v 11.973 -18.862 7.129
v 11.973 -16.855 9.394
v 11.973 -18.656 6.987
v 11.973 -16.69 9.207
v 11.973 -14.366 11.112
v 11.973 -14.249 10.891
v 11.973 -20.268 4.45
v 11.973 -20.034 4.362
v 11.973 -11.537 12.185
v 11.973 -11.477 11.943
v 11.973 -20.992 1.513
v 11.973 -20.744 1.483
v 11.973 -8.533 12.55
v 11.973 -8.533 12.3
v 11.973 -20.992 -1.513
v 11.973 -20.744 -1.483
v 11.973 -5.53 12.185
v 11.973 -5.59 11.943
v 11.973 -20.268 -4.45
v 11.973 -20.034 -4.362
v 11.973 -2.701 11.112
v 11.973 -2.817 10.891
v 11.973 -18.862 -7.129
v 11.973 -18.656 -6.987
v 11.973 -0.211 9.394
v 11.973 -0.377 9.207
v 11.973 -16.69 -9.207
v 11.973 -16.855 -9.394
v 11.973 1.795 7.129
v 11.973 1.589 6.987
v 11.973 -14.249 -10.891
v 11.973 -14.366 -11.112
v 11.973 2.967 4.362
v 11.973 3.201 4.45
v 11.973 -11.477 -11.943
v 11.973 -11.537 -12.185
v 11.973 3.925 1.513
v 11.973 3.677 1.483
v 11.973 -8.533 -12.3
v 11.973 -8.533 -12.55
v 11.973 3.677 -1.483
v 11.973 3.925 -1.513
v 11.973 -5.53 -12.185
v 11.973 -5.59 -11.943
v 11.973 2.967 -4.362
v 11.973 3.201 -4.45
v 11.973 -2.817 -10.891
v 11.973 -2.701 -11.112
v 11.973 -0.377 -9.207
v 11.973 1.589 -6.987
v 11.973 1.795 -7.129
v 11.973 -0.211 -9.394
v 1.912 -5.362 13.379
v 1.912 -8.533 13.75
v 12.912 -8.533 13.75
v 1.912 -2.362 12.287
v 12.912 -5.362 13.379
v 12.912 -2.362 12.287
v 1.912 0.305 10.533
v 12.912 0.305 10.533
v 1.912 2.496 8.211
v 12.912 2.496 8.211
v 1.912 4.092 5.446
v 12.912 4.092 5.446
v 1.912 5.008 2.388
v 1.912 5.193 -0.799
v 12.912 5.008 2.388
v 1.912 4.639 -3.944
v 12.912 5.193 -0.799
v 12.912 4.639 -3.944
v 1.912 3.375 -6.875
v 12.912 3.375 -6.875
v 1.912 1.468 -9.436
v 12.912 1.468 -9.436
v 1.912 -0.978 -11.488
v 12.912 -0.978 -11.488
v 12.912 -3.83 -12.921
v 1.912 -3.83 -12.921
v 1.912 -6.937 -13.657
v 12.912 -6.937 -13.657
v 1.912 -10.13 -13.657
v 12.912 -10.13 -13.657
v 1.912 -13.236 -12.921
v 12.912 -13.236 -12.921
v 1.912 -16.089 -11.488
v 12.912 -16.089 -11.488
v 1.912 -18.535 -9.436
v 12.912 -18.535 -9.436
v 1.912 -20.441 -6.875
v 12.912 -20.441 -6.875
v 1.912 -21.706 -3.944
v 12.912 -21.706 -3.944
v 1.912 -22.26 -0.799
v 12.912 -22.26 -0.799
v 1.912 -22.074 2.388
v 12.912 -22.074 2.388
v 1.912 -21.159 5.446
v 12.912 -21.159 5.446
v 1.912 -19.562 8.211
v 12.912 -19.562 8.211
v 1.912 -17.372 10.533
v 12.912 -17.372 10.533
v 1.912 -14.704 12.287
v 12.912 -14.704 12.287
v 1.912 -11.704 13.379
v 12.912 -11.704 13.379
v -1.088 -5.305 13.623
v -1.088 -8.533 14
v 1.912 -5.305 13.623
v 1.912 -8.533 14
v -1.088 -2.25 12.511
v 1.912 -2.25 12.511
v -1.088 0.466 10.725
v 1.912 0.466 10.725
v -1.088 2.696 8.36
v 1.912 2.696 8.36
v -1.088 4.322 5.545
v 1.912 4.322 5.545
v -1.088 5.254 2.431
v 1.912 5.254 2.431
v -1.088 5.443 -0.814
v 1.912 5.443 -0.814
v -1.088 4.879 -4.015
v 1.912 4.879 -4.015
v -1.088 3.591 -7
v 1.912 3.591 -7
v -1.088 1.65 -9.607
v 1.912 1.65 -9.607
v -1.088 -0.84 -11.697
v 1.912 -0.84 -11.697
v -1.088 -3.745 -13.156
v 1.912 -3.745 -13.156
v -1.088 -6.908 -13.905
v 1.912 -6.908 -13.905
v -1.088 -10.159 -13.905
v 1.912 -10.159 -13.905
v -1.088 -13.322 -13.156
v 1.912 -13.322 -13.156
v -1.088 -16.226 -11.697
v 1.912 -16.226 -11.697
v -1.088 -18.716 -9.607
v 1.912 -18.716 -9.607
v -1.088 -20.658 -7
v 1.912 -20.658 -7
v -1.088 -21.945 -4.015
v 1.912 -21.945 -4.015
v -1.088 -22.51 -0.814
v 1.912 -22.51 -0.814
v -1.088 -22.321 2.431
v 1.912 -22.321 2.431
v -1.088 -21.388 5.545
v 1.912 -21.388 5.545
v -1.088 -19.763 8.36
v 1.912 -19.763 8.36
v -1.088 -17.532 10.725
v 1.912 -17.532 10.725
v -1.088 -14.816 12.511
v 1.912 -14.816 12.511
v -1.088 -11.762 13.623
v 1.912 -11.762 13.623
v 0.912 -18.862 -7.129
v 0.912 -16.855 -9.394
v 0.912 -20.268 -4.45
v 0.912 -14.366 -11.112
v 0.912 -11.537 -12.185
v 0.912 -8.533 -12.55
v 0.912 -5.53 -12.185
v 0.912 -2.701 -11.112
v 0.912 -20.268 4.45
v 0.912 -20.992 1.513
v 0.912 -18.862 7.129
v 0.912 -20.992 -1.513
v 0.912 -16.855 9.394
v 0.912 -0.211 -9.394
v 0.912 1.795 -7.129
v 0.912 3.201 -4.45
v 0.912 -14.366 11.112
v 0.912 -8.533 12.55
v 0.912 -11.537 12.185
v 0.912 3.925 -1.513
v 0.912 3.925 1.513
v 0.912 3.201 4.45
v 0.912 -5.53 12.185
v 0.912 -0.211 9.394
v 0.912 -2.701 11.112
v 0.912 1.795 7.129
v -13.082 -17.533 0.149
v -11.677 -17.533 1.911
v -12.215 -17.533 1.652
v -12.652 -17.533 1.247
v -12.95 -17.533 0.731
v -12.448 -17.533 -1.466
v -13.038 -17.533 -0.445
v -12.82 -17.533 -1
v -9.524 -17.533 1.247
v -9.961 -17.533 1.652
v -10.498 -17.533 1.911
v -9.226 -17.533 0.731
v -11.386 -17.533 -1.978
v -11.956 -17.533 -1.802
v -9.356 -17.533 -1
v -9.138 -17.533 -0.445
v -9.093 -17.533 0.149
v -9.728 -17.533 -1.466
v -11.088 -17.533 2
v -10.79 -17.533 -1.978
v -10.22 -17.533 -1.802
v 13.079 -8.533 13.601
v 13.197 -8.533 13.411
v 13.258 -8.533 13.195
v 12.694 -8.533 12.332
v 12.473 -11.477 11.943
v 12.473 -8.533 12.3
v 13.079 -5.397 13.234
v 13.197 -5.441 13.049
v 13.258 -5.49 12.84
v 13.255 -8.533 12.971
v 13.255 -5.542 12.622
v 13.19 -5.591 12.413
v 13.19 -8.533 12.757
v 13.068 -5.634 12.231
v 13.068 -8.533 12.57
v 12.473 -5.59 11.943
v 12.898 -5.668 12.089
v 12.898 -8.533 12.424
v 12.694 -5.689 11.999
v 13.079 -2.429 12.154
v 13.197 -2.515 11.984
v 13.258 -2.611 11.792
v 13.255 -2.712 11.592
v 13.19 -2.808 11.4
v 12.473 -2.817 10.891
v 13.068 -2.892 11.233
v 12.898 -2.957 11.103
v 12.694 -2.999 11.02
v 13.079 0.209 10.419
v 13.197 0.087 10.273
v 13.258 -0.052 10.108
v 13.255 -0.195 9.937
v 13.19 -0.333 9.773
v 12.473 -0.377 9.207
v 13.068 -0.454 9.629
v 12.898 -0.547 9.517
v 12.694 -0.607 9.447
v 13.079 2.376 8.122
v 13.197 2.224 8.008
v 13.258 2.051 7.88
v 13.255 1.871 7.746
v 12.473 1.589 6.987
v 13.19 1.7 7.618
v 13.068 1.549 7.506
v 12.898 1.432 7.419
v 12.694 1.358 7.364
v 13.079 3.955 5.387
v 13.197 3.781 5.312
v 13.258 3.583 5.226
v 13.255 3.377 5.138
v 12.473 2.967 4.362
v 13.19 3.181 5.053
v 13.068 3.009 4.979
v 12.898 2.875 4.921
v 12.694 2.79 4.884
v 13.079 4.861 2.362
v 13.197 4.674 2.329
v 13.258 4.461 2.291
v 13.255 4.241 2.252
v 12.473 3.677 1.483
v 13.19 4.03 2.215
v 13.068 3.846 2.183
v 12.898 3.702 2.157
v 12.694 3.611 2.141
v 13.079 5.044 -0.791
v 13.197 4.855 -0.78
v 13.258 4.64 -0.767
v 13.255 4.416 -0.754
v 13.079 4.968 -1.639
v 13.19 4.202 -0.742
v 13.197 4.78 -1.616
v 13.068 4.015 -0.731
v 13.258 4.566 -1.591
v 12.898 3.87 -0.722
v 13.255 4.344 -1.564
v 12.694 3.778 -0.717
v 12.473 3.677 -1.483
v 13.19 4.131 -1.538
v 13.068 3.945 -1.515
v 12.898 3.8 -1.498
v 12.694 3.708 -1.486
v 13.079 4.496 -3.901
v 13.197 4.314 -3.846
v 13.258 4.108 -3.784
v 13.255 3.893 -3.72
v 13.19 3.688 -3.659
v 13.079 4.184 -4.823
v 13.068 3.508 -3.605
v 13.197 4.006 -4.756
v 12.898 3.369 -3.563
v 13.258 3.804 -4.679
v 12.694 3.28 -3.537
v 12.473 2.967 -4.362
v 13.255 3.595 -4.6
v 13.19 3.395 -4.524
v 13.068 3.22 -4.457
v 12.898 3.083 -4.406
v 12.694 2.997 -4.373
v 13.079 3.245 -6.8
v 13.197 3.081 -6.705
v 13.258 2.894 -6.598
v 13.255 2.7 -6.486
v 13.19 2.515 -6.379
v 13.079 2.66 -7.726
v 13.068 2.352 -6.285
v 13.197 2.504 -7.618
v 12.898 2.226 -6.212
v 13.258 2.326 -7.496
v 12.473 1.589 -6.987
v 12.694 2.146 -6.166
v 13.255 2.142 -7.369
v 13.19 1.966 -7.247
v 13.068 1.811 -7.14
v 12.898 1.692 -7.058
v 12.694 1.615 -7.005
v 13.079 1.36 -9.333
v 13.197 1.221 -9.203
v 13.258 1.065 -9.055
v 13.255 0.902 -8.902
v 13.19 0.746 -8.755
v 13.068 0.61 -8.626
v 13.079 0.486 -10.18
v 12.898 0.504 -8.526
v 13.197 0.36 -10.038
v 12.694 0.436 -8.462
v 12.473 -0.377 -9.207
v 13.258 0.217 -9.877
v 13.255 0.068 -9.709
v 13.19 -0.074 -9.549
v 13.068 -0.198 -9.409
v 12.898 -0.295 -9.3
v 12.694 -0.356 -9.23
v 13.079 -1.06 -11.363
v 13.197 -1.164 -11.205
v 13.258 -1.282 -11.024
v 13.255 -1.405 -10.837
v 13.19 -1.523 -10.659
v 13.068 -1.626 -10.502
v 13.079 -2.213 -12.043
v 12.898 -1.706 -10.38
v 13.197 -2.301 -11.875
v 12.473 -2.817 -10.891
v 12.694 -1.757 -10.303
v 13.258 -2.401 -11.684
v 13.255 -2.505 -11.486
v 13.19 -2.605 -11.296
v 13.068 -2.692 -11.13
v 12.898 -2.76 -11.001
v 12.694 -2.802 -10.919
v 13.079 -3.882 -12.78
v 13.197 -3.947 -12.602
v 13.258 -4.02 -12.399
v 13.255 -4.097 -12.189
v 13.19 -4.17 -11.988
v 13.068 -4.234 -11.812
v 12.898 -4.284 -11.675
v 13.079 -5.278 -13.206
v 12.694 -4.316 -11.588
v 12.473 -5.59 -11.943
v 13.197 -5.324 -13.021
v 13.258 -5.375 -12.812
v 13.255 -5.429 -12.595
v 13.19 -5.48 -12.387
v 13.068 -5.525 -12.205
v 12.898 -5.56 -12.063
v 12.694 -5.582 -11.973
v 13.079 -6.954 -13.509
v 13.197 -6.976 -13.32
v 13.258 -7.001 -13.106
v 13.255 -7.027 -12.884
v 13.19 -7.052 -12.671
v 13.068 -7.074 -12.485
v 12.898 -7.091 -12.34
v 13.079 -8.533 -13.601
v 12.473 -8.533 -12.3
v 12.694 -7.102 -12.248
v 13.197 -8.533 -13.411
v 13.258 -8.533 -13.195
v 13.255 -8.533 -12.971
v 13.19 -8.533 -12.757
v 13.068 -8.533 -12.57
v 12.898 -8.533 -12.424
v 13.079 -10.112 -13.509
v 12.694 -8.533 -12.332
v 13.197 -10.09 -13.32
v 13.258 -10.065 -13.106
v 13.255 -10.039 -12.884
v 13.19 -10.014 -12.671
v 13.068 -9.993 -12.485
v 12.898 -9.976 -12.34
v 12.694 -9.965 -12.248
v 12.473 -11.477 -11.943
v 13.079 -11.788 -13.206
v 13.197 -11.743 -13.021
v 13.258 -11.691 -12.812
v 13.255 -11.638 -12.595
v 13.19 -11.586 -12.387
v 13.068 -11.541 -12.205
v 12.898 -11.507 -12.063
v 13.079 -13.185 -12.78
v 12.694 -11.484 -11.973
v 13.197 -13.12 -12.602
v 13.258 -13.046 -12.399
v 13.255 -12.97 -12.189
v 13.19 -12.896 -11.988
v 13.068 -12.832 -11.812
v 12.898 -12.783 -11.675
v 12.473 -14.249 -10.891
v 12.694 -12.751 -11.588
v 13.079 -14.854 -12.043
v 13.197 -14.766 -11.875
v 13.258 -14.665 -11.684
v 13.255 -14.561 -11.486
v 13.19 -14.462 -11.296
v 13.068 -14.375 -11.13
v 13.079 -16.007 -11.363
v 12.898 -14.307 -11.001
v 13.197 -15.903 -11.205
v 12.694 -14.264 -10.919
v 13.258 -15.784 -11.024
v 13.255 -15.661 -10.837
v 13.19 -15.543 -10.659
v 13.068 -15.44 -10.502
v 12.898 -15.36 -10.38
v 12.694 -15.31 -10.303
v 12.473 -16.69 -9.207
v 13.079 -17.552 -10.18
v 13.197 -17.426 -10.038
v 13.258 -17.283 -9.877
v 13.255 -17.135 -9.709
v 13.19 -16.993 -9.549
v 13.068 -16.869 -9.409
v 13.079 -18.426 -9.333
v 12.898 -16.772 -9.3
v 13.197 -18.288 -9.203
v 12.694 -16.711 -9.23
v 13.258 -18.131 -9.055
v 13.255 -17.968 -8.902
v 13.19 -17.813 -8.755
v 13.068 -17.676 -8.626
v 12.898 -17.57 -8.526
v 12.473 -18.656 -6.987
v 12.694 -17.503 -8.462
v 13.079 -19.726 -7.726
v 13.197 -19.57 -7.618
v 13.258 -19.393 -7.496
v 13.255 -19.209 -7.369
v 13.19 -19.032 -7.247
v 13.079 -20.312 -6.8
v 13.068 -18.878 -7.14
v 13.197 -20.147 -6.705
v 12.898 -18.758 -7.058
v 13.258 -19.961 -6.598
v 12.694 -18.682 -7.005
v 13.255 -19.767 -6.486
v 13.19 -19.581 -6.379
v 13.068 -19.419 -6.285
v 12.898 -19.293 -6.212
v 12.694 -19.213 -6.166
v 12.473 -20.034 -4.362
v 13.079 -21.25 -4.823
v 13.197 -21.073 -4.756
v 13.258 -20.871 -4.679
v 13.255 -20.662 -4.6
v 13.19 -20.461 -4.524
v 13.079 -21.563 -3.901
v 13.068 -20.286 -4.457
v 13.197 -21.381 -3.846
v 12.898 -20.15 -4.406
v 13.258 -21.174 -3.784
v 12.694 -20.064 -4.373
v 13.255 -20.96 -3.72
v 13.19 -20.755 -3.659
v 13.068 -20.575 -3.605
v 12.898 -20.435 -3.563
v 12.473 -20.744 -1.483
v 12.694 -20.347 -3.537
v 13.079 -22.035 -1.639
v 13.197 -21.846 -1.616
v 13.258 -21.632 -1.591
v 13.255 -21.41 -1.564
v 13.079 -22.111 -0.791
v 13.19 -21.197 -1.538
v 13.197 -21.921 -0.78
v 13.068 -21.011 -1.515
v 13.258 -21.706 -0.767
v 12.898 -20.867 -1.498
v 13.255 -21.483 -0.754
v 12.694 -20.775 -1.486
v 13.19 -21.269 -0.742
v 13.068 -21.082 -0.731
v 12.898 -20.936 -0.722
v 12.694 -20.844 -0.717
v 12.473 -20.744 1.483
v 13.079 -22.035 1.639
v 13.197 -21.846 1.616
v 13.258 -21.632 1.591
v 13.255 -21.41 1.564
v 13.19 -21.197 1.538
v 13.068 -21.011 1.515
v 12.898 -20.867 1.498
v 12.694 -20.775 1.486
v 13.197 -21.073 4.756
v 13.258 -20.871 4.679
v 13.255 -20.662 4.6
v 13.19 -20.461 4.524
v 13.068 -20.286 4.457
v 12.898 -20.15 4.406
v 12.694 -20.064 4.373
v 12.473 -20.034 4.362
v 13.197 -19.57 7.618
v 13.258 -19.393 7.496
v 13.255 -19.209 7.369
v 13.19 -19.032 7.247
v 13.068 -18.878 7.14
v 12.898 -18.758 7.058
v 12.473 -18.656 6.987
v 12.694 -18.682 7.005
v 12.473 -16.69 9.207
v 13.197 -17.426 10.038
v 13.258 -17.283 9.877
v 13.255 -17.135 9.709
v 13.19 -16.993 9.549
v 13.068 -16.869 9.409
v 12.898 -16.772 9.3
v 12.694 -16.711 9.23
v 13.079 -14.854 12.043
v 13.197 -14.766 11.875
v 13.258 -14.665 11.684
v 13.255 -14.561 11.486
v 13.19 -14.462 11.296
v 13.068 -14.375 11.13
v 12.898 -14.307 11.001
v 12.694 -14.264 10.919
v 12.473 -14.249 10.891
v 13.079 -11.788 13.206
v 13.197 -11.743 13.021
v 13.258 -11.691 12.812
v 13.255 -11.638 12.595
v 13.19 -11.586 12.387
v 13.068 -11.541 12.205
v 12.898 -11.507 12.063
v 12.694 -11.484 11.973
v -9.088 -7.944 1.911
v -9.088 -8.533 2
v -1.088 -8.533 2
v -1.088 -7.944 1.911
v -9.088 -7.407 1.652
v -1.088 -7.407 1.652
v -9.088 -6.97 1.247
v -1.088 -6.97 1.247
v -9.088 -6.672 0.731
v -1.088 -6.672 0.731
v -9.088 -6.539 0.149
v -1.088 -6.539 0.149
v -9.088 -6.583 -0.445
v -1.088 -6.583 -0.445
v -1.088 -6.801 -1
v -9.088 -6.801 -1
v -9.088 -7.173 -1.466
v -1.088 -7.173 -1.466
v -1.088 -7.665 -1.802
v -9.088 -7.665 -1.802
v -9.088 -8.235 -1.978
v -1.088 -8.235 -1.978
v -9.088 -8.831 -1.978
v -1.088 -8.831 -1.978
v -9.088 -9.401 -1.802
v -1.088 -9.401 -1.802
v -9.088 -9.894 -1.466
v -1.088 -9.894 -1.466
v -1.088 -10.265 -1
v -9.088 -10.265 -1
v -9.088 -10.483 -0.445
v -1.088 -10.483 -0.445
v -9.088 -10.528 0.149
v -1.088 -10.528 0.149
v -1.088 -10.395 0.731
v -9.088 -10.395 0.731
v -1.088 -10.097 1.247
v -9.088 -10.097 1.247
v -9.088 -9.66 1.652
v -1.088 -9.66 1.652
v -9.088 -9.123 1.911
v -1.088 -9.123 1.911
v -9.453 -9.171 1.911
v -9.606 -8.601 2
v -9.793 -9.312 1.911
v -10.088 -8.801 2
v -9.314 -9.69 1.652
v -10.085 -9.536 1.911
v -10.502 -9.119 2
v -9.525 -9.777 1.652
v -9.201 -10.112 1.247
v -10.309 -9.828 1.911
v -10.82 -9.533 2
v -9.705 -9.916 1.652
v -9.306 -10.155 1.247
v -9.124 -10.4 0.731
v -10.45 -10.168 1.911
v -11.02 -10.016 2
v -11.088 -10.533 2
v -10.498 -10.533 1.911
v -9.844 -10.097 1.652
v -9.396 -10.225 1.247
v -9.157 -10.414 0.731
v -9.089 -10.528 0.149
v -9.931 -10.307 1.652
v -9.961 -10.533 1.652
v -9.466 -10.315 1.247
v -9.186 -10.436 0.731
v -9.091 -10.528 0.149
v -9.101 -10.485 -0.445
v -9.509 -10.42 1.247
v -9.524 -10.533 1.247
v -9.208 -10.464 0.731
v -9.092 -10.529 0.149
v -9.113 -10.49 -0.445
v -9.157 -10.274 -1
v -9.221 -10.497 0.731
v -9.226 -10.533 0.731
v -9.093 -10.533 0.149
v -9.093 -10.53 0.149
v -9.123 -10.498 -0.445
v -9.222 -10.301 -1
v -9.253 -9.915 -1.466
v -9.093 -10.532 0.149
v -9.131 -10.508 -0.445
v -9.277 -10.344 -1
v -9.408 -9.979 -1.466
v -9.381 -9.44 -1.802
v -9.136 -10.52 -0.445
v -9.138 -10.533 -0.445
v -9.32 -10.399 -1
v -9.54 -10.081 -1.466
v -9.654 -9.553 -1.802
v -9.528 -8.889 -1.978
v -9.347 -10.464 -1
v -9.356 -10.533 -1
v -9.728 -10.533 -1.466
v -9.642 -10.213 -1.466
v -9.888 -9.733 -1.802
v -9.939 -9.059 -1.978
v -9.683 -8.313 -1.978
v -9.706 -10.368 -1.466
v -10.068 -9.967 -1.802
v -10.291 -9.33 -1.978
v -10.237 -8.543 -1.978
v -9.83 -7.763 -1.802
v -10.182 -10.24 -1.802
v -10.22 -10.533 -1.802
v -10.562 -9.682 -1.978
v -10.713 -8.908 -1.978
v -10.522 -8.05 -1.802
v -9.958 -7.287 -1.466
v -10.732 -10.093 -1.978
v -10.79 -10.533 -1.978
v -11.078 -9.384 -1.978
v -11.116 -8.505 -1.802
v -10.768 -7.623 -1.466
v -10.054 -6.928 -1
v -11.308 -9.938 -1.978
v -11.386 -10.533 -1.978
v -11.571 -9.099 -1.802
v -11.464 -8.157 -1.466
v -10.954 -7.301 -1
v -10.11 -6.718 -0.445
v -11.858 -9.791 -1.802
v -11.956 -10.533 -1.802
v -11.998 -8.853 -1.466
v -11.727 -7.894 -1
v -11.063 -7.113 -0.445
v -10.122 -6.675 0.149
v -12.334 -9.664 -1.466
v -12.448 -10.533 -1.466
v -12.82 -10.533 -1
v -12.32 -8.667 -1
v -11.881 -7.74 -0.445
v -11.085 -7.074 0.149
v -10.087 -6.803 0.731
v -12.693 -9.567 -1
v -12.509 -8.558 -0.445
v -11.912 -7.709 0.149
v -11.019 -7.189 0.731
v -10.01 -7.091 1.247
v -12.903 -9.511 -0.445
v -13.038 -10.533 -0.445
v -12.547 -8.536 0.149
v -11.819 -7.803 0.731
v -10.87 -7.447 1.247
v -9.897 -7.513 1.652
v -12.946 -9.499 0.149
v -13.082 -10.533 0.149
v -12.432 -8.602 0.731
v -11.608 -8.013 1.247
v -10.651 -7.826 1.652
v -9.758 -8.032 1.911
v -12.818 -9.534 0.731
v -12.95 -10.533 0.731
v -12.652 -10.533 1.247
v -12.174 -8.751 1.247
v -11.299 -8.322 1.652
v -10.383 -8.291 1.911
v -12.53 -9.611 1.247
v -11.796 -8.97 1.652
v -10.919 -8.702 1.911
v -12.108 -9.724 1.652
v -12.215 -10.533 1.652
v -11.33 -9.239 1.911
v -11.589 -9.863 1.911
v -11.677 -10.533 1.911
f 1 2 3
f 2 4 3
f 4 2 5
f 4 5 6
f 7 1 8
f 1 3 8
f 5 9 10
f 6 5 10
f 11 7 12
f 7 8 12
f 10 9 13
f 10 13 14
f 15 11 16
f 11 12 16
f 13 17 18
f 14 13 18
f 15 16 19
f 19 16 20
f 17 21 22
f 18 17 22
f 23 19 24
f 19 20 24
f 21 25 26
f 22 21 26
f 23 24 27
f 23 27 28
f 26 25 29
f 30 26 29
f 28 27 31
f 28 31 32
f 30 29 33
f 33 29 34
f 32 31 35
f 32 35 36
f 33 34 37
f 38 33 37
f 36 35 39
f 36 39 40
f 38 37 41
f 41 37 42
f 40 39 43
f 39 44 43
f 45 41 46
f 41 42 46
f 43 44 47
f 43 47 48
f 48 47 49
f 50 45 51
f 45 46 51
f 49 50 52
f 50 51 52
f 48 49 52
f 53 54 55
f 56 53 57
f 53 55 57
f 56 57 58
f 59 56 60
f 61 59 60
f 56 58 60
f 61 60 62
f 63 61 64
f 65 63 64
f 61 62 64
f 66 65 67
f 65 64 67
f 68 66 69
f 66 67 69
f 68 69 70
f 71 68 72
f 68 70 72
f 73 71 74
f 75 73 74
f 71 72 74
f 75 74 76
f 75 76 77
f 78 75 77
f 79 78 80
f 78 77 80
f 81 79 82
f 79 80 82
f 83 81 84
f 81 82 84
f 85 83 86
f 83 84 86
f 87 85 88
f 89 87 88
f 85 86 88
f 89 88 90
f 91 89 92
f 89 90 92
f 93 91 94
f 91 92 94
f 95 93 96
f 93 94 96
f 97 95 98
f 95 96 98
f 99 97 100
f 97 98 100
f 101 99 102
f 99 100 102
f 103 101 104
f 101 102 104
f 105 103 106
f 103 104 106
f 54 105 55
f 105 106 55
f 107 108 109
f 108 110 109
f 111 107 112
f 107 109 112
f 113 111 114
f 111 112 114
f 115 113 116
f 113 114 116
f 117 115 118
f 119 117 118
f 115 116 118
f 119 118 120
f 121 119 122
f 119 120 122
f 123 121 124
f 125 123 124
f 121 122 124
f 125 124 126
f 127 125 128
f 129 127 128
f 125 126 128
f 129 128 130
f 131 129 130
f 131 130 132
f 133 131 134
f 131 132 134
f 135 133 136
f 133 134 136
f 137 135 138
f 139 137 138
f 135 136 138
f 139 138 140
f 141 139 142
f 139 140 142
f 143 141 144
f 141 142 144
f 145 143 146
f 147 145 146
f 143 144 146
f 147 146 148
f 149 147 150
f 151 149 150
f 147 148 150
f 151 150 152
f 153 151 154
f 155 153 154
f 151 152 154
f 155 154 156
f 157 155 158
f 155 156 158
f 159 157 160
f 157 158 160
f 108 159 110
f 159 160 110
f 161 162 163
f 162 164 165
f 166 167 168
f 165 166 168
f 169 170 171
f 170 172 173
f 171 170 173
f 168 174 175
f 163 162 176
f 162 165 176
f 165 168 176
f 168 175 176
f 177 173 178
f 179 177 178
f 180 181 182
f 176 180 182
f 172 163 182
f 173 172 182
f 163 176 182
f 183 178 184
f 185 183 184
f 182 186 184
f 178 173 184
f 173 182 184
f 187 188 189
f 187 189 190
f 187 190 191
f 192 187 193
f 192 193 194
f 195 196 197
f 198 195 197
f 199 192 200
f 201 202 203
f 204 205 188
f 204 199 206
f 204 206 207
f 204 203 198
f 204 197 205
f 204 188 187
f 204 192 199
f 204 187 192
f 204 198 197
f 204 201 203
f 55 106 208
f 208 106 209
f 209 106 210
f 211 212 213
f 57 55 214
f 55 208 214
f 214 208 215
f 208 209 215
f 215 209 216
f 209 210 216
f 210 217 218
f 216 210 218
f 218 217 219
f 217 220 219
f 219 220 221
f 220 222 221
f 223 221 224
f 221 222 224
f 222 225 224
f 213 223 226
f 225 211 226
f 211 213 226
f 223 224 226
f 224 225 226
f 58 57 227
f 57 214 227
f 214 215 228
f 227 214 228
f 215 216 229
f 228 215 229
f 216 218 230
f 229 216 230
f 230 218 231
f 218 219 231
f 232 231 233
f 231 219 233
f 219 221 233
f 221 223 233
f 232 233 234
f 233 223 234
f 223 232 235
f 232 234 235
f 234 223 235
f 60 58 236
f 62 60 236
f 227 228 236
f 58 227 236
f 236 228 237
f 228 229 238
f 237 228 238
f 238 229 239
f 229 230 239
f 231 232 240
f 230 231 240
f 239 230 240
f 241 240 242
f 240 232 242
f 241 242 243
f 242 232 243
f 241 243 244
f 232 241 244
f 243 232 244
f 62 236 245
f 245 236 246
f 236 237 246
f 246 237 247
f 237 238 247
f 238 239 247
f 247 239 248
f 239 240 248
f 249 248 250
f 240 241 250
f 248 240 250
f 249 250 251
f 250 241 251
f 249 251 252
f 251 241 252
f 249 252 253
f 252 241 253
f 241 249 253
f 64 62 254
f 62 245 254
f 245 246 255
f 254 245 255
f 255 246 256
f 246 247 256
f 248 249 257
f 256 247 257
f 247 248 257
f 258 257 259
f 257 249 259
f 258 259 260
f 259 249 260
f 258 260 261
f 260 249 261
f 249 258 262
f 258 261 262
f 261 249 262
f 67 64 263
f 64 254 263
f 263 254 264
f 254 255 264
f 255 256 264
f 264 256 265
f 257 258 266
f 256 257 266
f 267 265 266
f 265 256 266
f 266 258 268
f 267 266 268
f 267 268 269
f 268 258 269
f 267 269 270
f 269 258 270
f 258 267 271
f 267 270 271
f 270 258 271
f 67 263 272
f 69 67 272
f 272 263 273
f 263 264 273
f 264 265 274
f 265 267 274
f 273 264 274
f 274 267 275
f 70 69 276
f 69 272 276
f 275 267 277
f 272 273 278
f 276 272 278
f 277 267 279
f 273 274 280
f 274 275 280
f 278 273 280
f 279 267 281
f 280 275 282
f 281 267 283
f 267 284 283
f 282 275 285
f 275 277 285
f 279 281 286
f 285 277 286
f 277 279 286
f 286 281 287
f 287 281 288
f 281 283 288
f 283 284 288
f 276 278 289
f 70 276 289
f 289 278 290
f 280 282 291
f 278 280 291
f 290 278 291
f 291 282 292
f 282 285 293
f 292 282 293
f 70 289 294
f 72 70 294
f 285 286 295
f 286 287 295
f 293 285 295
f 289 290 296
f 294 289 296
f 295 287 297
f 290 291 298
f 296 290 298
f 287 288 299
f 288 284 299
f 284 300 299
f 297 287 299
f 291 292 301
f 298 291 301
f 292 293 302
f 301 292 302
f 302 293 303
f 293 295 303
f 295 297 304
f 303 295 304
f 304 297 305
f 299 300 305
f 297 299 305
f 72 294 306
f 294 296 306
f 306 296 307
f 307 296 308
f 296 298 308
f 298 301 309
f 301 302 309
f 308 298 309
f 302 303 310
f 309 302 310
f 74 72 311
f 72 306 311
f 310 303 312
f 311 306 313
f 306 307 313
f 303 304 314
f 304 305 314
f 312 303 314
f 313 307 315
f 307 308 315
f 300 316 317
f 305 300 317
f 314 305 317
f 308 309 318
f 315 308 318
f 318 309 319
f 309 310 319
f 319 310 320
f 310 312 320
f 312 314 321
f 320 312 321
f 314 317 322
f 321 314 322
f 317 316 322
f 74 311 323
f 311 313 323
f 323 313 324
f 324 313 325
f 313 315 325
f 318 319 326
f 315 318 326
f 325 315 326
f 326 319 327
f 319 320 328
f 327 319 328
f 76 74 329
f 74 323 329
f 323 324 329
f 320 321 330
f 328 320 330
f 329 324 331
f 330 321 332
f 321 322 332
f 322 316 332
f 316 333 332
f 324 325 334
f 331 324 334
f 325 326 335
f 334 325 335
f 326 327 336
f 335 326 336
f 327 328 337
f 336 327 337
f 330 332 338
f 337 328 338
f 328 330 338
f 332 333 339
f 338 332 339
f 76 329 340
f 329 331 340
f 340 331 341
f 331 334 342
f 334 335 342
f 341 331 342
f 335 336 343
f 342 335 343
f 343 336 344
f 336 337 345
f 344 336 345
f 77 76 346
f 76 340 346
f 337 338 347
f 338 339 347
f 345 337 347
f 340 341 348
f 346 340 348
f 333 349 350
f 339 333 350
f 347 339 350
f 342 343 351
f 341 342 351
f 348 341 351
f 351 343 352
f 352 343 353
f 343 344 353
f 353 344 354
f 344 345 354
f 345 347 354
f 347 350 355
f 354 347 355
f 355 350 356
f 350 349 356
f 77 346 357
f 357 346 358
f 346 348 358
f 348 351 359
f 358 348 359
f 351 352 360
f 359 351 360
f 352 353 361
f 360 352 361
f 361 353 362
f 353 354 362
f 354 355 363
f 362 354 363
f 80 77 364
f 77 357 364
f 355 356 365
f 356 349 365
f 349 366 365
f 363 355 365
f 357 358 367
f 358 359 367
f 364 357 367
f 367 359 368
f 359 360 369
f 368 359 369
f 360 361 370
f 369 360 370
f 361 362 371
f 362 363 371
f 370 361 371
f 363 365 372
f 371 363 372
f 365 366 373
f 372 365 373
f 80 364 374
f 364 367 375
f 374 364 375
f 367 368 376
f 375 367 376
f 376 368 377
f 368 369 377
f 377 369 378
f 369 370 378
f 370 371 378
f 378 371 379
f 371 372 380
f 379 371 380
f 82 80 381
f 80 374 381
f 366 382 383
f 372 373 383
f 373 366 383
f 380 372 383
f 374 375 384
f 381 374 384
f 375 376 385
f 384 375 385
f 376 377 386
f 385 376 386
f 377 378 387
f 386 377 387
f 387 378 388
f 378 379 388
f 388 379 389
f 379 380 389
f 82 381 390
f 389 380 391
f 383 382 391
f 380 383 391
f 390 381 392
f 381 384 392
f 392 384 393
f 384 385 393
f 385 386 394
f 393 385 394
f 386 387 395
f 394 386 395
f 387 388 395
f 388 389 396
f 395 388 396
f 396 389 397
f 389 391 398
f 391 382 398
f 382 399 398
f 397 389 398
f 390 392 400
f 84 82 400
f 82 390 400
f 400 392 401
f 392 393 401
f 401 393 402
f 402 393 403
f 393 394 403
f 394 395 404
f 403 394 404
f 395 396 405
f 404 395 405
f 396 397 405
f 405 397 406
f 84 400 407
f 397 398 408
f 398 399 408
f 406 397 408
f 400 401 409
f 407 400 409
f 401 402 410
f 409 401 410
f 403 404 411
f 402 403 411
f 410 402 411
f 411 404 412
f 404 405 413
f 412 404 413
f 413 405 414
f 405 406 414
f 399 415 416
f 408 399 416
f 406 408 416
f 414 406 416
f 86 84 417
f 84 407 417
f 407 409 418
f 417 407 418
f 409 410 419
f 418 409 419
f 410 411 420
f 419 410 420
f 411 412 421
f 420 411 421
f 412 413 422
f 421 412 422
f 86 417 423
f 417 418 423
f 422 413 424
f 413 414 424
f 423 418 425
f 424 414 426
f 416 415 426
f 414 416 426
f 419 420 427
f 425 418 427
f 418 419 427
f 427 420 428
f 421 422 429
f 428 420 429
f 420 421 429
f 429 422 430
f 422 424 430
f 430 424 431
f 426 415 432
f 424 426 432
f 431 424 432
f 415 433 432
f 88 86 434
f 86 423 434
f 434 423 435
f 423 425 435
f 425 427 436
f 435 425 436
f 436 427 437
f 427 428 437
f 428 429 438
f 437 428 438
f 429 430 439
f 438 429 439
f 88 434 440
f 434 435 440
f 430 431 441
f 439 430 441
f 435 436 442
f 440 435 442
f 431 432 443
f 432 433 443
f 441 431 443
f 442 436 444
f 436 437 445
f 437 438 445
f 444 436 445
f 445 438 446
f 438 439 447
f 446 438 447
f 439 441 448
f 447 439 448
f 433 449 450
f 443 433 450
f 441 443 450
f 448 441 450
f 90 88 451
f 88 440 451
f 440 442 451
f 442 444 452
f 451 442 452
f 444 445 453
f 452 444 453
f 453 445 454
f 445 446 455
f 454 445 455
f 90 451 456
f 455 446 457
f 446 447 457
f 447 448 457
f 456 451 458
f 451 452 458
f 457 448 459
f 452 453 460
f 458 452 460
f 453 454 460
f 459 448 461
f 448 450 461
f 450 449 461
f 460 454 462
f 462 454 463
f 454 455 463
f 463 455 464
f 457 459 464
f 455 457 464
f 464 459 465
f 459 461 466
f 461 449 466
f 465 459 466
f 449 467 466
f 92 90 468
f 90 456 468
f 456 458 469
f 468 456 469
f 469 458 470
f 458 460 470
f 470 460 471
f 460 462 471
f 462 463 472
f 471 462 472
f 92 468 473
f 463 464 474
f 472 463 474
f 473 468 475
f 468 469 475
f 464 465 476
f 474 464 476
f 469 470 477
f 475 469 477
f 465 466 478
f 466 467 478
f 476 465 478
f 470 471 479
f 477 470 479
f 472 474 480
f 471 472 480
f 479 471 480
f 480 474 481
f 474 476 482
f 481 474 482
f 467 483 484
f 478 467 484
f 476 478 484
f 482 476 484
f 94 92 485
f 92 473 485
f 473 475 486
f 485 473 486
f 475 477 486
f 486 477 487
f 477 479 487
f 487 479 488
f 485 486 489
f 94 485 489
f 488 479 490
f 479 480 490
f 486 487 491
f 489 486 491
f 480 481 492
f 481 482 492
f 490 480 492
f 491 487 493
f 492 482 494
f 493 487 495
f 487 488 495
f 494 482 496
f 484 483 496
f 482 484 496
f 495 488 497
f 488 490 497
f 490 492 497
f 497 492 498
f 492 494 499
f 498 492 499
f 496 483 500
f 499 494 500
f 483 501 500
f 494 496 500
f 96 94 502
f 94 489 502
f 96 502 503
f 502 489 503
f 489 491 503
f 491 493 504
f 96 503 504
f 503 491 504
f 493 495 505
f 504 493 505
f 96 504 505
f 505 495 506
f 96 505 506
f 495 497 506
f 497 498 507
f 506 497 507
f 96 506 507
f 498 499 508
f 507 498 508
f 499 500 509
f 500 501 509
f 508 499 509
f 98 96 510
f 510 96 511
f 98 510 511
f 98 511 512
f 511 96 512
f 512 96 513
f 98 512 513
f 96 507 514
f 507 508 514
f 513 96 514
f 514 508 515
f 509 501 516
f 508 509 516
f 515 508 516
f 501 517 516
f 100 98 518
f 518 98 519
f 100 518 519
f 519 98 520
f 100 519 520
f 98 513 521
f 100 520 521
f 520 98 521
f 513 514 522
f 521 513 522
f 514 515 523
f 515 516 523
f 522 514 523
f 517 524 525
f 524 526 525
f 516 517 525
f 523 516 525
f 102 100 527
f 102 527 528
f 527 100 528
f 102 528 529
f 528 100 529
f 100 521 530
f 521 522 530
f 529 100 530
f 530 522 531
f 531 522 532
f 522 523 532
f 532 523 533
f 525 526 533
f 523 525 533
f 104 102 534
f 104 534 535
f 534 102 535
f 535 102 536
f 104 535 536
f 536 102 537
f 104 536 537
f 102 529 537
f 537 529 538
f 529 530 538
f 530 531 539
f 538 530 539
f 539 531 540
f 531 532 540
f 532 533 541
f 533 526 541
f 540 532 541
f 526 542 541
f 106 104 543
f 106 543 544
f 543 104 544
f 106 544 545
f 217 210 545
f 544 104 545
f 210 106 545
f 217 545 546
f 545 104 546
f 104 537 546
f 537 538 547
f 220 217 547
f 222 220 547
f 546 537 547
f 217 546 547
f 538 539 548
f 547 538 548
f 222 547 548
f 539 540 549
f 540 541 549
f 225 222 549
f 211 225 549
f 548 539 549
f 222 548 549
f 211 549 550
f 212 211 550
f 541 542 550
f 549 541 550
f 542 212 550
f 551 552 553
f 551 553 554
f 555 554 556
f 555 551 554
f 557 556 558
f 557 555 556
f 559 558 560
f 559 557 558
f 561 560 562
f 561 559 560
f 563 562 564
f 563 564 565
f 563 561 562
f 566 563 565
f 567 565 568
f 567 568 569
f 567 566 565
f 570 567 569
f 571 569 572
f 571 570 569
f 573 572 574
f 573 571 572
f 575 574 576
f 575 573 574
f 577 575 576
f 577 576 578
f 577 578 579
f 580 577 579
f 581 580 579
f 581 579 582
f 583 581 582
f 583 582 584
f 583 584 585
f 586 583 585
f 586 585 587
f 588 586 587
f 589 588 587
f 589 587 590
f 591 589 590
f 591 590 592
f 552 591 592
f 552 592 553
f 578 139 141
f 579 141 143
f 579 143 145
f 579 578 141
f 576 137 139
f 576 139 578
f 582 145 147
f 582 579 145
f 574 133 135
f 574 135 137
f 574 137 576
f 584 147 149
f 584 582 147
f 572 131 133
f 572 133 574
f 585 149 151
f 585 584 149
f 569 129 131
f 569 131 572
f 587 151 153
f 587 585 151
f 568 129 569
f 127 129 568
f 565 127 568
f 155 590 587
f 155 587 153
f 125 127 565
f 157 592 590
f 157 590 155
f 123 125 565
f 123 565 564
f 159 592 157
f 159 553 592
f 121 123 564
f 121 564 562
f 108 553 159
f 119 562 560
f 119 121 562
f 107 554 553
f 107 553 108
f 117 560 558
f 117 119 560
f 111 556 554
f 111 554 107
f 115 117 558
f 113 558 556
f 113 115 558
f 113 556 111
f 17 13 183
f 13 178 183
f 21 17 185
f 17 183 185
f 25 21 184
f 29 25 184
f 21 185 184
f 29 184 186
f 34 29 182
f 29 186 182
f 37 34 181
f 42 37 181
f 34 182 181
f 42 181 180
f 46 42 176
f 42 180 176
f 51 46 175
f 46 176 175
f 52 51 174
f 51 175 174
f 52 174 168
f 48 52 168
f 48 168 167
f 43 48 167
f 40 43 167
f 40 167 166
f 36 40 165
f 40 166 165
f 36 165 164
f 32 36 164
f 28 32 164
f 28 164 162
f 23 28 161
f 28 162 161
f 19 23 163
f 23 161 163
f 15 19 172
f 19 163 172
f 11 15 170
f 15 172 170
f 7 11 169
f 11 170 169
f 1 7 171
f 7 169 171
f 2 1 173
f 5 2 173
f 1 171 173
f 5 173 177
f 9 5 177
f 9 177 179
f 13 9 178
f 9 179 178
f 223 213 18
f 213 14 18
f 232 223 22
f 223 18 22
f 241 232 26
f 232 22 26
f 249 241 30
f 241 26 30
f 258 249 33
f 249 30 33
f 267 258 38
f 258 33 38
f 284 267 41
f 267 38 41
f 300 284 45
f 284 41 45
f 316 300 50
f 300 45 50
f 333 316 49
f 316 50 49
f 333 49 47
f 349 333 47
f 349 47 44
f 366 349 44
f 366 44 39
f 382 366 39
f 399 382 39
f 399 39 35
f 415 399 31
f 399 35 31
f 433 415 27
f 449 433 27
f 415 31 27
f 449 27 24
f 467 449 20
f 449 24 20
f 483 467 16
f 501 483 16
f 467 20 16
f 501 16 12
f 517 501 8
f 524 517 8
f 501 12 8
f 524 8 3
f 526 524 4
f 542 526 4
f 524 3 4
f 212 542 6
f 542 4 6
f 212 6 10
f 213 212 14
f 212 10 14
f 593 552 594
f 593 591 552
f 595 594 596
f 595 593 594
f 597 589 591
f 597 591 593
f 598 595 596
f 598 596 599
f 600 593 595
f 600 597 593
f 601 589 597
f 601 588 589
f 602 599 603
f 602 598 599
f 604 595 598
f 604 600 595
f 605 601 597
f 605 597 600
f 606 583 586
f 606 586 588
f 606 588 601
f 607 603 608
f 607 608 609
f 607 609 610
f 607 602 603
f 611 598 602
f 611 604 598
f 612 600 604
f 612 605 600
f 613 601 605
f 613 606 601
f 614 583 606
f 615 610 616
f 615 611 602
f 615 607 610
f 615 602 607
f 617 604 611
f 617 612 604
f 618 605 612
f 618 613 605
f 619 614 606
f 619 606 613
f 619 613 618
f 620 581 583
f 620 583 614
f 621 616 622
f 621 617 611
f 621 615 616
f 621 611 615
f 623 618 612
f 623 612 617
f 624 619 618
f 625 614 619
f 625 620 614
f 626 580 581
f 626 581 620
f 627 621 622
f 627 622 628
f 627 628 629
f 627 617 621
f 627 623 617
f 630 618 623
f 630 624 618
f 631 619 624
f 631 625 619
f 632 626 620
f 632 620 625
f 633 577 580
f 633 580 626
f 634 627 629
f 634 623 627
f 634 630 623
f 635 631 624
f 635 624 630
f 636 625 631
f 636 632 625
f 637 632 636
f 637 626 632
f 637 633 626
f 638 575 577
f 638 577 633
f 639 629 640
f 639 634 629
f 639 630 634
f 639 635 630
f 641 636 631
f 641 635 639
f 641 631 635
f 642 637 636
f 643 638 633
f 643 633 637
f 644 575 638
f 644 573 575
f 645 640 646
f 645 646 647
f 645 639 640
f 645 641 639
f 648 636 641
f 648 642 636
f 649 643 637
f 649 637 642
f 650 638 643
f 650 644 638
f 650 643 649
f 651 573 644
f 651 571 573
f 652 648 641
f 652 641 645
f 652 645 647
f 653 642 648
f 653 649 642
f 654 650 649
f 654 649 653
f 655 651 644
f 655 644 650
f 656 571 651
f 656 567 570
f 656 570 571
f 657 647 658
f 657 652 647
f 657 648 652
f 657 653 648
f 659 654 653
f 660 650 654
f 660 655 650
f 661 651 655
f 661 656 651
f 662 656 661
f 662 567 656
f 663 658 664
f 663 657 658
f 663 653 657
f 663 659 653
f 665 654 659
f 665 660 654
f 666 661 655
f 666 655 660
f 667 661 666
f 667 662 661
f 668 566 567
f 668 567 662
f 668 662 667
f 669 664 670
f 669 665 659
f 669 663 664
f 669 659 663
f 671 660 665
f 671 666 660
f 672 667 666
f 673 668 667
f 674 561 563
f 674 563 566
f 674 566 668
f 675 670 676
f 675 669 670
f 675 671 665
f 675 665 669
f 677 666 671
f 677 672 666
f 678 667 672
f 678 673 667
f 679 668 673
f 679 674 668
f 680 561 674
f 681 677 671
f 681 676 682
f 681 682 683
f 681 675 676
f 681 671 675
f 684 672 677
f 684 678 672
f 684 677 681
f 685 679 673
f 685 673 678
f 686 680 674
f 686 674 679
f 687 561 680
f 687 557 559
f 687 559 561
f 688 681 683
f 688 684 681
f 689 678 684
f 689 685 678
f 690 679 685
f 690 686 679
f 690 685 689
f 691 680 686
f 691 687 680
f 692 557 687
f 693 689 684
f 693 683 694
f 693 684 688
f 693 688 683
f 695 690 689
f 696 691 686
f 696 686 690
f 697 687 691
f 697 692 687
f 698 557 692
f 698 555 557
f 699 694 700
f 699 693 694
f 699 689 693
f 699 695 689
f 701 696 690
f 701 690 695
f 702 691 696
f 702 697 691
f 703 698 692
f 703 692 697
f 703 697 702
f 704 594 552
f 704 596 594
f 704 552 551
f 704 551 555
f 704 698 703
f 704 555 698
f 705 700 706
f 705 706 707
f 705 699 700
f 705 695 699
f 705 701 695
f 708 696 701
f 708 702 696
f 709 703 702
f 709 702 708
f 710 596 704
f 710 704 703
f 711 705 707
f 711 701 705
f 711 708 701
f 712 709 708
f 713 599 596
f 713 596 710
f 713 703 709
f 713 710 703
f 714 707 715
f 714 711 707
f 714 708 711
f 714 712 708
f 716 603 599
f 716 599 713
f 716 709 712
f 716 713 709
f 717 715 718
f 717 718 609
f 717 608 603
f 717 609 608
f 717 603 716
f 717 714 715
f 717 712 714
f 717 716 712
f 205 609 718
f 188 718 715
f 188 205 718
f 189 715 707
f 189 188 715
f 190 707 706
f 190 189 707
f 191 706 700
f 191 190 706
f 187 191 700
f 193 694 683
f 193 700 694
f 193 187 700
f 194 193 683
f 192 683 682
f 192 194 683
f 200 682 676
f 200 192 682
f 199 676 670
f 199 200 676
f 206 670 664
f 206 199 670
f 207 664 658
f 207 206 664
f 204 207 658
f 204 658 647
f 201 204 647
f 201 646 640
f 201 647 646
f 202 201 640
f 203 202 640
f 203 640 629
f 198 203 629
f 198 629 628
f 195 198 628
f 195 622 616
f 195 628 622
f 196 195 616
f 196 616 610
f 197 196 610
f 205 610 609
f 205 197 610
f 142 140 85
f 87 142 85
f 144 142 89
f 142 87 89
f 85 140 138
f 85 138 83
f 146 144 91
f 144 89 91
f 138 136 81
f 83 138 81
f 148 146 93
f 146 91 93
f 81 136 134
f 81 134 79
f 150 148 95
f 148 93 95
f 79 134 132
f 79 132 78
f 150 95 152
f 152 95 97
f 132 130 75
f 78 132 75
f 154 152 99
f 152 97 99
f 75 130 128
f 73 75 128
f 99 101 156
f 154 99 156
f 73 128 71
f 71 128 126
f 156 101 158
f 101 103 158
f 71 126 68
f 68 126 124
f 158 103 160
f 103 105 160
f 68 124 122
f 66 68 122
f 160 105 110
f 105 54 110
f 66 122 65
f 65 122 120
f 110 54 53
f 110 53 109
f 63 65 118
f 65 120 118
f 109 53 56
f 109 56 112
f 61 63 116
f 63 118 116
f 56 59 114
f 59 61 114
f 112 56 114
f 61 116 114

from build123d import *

# Parameters (mm, degrees)
SKETCH2_R           = 14
BOSS_EXTRUDE1_DEPTH = 2
SKETCH3_R           = 2


with BuildPart() as part:
    # Sketch1 → Revolve1 (revolve)
    with BuildSketch(Plane(origin=(0, 0, 0), x_dir=(-1, 0, 0), z_dir=(0, 0, -1)), mode=Mode.PRIVATE) as revolve1_sk:
        with BuildLine():
            Line((-11.972812665, 3.766736765), (-11.972812665, 4.016736765))
            Line((-11.972812665, 4.016736765), (-0.912123334, 4.016736765))
            Line((-0.912123334, 4.016736765), (-0.912123334, 5.466736765))
            Line((-0.912123334, 5.466736765), (-1.912123334, 5.466736765))
            Line((-1.912123334, 5.466736765), (-1.912123334, 5.216736765))
            Line((-1.912123334, 5.216736765), (-12.912123334, 5.216736765))
            ThreePointArc((-12.912123334, 5.216736765), (-13.230357031, 4.328770979), (-12.472812665, 3.766736765))
            Line((-12.472812665, 3.766736765), (-11.972812665, 3.766736765))
        make_face()
    revolve(revolve1_sk.sketch.rotate(Axis((12.175741694, -8.533263235, 0), (-1, 0, 0)), 270), axis=Axis((12.175741694, -8.533263235, 0), (-1, 0, 0)))

    # Sketch2 → Boss-Extrude1 (add)
    with BuildSketch(Plane.ZY.offset(-0.912123334)):
        with Locations((0, -8.533263235)):
            Circle(SKETCH2_R)
    extrude(amount=BOSS_EXTRUDE1_DEPTH)

    # Sweep1: sweep along a path in Sketch4
    with BuildLine(Plane.XY) as sweep1_path:
        Line((-1.087876666, -8.533263235), (-9.087876666, -8.533263235))
        ThreePointArc((-9.087876666, -8.533263235), (-10.502090228, -9.119049673), (-11.087876666, -10.533263235))
        Line((-11.087876666, -10.533263235), (-11.087876666, -17.533263235))
    # Sketch3 → Sweep1 (sweep)
    with BuildSketch(Plane.ZY.offset(1.087876666)):
        with Locations((0, -8.533263235)):
            Circle(SKETCH3_R)
    sweep(path=sweep1_path.line)


solid = part.part
